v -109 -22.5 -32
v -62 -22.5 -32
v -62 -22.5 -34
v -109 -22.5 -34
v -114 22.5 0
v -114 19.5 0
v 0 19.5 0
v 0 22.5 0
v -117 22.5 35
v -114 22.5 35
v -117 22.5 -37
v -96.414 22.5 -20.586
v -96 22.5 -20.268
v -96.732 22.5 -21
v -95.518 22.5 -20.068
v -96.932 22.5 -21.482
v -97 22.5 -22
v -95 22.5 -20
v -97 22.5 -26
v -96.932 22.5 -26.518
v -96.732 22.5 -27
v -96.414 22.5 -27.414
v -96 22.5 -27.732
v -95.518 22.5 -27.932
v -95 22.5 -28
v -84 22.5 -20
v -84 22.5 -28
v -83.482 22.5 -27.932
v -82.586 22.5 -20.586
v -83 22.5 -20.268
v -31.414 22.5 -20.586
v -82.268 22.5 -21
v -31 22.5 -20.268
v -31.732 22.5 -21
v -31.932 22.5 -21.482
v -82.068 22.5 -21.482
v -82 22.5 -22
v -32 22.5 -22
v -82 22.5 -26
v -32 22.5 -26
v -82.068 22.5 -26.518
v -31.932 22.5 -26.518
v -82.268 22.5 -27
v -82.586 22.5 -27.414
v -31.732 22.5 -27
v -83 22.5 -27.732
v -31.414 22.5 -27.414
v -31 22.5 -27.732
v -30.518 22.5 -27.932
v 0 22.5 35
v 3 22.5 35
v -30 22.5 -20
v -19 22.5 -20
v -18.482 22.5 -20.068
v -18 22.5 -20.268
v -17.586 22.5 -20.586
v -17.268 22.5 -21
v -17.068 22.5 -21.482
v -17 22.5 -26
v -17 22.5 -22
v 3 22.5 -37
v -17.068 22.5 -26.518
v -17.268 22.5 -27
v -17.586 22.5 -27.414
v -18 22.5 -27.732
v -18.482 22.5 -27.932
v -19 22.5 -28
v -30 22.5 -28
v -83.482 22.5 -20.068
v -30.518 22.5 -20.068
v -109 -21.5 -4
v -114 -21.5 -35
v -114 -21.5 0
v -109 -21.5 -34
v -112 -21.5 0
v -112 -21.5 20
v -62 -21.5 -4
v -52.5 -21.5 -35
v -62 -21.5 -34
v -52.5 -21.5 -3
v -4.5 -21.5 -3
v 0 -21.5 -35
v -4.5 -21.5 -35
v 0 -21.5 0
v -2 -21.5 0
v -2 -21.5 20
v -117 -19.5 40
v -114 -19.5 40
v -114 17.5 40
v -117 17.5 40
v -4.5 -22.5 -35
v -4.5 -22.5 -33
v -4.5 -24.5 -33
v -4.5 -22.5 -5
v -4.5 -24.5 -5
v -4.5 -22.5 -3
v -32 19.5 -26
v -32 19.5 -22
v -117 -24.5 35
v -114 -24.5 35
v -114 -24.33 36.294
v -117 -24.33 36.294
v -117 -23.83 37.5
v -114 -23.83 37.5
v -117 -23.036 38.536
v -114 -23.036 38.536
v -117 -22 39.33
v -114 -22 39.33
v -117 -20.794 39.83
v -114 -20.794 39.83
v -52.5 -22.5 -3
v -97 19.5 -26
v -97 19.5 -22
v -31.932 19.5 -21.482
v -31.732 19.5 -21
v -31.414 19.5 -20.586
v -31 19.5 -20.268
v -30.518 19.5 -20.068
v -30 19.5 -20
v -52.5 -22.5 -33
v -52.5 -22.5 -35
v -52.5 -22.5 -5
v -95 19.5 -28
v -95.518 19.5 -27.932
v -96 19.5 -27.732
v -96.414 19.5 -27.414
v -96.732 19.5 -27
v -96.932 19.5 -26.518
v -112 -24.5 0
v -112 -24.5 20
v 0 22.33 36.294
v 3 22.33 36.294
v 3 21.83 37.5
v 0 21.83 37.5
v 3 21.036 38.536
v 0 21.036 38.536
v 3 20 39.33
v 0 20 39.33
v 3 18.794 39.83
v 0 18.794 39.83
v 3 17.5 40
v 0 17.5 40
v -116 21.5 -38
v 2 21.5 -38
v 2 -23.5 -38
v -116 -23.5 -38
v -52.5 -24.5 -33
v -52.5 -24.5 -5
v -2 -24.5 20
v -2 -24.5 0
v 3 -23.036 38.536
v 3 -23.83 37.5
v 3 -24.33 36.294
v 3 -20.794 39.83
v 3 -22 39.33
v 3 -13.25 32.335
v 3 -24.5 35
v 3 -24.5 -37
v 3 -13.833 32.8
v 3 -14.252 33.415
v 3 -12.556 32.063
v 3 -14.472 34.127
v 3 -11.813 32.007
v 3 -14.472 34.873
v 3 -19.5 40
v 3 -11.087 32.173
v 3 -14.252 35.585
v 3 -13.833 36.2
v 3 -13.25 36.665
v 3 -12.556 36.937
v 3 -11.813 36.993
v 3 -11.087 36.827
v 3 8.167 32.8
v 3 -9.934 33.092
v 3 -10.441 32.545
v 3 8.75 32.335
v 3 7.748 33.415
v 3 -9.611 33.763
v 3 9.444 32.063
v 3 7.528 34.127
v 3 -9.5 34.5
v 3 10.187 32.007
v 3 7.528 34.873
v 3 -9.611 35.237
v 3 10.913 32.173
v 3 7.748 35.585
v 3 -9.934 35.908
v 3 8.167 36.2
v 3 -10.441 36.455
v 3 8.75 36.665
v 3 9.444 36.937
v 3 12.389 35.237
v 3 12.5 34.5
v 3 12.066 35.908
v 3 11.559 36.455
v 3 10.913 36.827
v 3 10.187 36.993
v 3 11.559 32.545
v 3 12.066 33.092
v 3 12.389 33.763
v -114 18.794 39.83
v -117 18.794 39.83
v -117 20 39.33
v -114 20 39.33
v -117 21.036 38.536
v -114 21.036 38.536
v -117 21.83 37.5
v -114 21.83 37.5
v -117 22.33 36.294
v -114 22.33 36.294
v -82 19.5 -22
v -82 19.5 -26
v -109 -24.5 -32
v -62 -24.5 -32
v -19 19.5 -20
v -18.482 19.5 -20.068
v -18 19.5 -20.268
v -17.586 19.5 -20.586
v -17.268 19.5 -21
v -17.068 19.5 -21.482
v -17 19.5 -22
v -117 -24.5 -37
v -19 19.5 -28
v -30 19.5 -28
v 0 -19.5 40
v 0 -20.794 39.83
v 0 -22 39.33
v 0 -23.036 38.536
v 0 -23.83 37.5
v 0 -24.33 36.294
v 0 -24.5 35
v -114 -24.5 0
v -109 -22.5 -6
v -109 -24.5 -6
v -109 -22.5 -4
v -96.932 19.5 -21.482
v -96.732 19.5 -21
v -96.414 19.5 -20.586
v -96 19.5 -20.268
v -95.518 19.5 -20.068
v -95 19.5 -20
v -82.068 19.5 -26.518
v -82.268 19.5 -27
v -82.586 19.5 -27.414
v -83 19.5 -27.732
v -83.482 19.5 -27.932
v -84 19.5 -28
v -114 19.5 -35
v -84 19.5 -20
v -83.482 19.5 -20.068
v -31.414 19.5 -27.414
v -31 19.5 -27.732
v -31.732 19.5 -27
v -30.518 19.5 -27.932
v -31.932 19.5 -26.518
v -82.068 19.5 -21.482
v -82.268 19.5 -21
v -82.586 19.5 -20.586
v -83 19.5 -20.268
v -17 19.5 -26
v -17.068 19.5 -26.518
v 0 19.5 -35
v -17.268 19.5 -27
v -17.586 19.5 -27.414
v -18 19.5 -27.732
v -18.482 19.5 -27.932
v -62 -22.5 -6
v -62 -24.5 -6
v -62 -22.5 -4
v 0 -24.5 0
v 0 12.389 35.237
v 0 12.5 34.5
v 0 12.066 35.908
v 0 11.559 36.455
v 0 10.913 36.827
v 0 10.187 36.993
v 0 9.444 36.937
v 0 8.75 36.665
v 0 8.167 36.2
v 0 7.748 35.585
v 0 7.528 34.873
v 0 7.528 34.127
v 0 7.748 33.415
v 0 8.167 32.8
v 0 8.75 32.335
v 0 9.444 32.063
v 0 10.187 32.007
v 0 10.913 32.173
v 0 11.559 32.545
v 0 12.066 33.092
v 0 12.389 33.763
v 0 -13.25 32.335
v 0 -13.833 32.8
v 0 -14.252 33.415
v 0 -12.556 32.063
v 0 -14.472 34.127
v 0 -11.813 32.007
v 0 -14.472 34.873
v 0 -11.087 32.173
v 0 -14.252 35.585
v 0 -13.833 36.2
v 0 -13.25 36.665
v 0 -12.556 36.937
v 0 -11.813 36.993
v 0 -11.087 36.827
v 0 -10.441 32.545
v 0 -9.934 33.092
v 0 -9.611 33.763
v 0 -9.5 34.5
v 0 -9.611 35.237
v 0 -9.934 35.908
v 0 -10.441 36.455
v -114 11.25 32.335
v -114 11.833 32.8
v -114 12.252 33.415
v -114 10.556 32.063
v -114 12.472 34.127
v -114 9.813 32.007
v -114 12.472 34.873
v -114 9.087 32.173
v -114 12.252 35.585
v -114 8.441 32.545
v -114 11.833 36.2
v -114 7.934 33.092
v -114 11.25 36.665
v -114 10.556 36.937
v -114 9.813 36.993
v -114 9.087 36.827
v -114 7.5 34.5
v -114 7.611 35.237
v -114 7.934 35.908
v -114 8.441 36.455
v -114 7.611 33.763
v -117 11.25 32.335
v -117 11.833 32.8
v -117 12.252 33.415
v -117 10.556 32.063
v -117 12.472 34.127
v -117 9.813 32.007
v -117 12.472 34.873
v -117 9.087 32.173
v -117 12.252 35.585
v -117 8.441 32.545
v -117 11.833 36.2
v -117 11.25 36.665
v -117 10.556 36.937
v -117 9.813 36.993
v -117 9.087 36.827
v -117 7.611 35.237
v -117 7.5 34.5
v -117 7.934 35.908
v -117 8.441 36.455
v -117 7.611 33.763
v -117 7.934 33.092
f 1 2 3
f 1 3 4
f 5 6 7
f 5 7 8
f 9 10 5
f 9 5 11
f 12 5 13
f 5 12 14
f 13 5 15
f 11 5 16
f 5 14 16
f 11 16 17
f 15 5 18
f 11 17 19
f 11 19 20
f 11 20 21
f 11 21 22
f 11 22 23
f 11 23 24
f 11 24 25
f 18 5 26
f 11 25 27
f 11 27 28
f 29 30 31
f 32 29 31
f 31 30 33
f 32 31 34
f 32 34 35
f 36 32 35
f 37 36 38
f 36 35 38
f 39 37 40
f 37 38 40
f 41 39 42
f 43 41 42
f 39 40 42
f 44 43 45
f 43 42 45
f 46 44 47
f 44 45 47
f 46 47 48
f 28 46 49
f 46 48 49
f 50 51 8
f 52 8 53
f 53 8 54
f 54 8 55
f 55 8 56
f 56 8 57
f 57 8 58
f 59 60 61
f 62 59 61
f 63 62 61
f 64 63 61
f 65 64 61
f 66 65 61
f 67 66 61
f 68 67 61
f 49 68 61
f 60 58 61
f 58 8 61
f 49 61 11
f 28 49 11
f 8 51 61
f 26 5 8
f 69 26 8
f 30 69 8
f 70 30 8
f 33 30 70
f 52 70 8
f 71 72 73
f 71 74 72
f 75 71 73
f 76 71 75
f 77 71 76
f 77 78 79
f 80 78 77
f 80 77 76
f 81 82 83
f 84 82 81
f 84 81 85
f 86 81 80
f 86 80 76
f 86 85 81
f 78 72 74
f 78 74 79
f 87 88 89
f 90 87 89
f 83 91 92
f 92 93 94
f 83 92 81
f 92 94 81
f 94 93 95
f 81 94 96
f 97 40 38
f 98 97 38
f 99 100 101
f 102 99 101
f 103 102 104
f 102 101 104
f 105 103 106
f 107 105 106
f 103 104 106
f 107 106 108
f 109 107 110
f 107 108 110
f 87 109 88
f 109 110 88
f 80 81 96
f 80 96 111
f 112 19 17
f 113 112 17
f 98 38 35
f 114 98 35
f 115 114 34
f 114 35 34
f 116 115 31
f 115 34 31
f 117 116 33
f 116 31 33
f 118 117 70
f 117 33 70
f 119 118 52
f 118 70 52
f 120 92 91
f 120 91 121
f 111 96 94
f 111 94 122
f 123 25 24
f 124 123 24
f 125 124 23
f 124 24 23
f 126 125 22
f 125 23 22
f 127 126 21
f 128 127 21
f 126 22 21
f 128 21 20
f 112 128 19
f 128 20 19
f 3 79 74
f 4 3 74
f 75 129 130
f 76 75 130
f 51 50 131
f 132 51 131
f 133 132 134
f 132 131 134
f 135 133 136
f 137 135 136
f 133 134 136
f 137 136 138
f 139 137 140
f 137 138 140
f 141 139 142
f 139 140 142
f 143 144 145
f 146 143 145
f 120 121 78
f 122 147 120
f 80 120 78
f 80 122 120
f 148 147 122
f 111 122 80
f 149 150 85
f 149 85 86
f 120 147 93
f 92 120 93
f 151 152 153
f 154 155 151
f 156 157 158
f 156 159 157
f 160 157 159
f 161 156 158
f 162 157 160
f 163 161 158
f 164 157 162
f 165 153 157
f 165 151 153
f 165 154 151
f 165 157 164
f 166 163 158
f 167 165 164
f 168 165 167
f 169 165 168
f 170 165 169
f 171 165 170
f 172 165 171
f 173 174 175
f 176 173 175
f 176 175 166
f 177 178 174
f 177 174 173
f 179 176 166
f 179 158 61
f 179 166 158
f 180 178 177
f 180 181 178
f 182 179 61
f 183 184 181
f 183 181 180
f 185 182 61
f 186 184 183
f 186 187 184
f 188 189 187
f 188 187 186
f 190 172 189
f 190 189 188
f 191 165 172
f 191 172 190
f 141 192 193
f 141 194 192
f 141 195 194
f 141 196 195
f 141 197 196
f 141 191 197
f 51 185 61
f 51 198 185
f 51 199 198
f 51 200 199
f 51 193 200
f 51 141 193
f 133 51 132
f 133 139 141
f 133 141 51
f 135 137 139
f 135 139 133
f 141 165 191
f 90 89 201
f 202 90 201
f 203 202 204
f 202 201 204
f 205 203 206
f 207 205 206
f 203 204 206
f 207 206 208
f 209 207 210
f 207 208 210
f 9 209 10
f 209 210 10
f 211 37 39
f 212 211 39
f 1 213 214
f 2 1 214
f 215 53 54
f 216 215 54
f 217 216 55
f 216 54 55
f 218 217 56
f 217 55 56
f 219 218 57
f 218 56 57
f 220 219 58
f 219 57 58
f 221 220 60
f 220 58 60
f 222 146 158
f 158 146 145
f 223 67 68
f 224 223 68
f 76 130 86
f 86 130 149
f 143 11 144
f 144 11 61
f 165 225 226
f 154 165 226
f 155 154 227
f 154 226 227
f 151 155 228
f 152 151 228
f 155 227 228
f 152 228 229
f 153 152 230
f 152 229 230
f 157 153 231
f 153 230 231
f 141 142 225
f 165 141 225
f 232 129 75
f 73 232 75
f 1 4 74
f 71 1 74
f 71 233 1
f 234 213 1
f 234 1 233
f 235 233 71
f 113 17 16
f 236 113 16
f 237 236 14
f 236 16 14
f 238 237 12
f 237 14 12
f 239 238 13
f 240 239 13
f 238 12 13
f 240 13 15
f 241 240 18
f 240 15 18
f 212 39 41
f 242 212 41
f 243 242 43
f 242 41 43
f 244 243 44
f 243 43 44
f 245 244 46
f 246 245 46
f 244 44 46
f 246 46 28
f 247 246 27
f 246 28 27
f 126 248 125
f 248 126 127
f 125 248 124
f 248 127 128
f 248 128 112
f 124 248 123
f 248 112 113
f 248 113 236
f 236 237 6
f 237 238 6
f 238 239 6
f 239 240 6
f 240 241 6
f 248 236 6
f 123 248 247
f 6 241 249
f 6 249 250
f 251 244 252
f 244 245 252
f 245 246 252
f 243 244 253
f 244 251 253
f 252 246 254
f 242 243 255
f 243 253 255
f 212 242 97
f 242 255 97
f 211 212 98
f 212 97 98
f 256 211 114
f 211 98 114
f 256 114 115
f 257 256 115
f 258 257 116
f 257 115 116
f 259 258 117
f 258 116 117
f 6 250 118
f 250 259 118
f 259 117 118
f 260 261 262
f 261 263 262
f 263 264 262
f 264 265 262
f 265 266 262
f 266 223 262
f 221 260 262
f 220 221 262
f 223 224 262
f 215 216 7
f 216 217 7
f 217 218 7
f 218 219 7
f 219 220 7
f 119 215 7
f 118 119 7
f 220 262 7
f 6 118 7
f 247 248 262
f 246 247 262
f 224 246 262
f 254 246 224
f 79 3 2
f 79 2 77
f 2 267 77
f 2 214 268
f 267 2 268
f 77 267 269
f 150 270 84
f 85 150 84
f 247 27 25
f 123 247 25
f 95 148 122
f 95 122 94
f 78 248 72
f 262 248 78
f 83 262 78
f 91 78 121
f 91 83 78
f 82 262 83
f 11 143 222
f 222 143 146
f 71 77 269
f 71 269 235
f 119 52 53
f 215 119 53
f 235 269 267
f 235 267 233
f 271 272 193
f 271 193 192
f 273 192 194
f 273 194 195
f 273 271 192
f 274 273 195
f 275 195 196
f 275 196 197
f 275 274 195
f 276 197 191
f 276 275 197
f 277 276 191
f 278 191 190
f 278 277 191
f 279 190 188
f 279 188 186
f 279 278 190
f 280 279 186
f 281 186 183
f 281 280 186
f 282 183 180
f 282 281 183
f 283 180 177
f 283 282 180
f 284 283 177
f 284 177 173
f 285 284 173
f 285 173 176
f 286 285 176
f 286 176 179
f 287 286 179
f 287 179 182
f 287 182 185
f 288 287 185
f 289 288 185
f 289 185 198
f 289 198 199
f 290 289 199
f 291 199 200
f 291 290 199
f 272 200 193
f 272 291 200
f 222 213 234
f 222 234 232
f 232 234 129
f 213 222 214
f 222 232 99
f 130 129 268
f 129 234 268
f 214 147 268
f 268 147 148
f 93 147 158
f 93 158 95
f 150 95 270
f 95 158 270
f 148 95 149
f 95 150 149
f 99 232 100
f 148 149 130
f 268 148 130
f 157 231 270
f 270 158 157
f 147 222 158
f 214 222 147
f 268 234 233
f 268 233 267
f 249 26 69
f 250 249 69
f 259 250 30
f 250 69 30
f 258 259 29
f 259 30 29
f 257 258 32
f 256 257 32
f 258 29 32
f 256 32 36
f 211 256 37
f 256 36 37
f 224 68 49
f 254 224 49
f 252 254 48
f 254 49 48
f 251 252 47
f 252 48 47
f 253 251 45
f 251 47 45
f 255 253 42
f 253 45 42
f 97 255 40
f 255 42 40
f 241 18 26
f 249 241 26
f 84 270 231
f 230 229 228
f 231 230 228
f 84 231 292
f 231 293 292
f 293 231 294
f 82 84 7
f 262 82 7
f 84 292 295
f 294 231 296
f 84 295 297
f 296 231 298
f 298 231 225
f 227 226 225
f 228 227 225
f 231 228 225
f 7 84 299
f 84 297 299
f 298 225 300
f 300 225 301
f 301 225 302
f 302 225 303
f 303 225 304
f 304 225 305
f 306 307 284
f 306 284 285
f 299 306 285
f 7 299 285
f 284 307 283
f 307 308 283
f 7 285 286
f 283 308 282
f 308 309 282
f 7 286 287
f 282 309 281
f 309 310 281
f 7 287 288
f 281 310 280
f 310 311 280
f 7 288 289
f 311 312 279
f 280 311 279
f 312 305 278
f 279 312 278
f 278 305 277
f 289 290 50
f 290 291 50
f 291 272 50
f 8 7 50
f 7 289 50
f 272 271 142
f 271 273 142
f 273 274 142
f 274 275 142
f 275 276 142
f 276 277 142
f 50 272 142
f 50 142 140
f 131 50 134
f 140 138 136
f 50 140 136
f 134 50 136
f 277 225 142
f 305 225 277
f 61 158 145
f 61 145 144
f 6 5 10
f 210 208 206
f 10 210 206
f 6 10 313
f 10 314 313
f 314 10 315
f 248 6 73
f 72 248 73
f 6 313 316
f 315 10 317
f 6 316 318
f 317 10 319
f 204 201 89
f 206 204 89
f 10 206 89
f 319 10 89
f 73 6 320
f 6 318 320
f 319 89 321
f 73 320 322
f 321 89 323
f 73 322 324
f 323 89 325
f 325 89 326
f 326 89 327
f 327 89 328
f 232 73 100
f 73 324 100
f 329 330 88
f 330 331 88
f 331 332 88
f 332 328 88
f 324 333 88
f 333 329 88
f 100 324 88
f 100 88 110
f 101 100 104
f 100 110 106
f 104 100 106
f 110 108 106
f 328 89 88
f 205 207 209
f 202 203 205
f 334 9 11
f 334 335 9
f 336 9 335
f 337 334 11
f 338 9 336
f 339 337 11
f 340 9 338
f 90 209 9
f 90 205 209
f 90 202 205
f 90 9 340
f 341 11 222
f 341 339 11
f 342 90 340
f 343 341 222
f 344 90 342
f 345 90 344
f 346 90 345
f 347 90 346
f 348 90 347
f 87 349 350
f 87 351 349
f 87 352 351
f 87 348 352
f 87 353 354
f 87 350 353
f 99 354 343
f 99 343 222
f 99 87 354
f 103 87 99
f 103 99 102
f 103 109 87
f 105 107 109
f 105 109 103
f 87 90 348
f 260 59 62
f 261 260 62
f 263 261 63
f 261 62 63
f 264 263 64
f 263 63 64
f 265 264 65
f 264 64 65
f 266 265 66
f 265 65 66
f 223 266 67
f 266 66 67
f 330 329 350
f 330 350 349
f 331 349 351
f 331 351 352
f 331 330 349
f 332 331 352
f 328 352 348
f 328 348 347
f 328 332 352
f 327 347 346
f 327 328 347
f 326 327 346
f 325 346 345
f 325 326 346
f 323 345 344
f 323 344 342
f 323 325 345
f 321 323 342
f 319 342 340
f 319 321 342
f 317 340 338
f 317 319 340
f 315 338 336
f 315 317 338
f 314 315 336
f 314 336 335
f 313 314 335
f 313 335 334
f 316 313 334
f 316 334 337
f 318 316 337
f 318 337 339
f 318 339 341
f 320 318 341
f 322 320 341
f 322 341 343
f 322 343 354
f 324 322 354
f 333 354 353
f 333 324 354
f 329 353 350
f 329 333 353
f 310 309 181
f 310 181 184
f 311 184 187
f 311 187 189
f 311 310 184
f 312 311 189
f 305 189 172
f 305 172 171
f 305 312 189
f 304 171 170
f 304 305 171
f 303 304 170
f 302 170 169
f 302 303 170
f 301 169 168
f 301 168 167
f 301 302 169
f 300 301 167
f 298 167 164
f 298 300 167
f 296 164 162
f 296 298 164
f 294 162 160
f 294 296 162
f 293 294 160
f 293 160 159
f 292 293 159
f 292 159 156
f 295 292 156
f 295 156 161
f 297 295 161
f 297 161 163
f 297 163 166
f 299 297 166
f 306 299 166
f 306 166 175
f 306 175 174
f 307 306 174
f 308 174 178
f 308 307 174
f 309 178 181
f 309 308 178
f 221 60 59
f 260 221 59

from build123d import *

# Parameters (mm, degrees)
F2_R      = 2.5
F3_DEPTH  = 3
F4_W      = 3
F4_H      = 3
F4_W_2    = 41
F4_H_2    = 35
F5_DEPTH  = 114
F6_R      = 2.5
F7_DEPTH  = 3
F8_W      = 110
F8_H      = 20
F9_DEPTH  = 3
F10_W     = 47
F10_H     = 26
F10_W_2   = 48
F10_H_2   = 28
F11_DEPTH = 3
F13_DEPTH = 3
F14_SIZE  = 1
F16_W     = 48
F16_H     = 2
F16_W_2   = 47
F17_DEPTH = 1


with BuildPart() as f3:
    # F2 (on Right) → F3 (new body)
    with BuildSketch(Plane.YZ):
        with BuildLine():
            ThreePointArc((22.5, 35), (21.0355339059, 38.5355339059), (17.5, 40))
            Line((17.5, 40), (-19.5, 40))
            ThreePointArc((-19.5, 40), (-23.0355339059, 38.5355339059), (-24.5, 35))
            Line((-24.5, 35), (-24.5, -38))
            Line((-24.5, -38), (22.5, -38))
            Line((22.5, -38), (22.5, 35))
        make_face()
        with Locations((-12, 34.5)):
            Circle(F2_R, mode=Mode.SUBTRACT)
        with Locations((10, 34.5)):
            Circle(F2_R, mode=Mode.SUBTRACT)
    extrude(amount=F3_DEPTH)

    # F4 (on Right) → F5 (join)
    with BuildSketch(Plane.YZ):
        with Locations((21, -36.5)):
            Rectangle(F4_W, F4_H)
        with Locations((-1, -36.5)):
            Rectangle(F4_W_2, F4_H)
        with Locations((21, -17.5)):
            Rectangle(F4_W, F4_H_2)
        with Locations((-23, -36.5)):
            Rectangle(F4_W, F4_H)
        with Locations((-23, -17.5)):
            Rectangle(F4_W, F4_H_2)
    extrude(amount=-F5_DEPTH)

    # F6 (on face) → F7 (join)
    with BuildSketch(Plane(origin=(-114, 0, 0), x_dir=(0, -1, 0), z_dir=(-1, 0, 0))):
        with BuildLine():
            ThreePointArc((24.5, 35), (23.0355339059, 38.5355339059), (19.5, 40))
            Line((19.5, 40), (-17.5, 40))
            ThreePointArc((-17.5, 40), (-21.0355339059, 38.5355339059), (-22.5, 35))
            Line((-22.5, 35), (-22.5, -38))
            Line((-22.5, -38), (24.5, -38))
            Line((24.5, -38), (24.5, 35))
        make_face()
        with Locations((-10, 34.5)):
            Circle(F6_R, mode=Mode.SUBTRACT)
    extrude(amount=F7_DEPTH)

    # F8 (on face) → F9 (join)
    with BuildSketch(Plane.XZ.offset(24.5)):
        with Locations((-57, 10)):
            Rectangle(F8_W, F8_H)
    extrude(amount=-F9_DEPTH)

    # F10 (on face) → F11 (cut, through all)
    with BuildSketch(Plane.XZ.offset(24.5)):
        with Locations((-85.5, -19)):
            Rectangle(F10_W, F10_H)
        with Locations((-28.5, -19)):
            Rectangle(F10_W_2, F10_H_2)
    extrude(amount=-F11_DEPTH, mode=Mode.SUBTRACT)

    # F12 (on face) → F13 (cut, through all)
    with BuildSketch(Plane(origin=(0, 22.5, 0), x_dir=(-1, 0, 0), z_dir=(0, 1, 0))):
        with BuildLine():
            ThreePointArc((82, -26), (82.5857864376, -27.4142135624), (84, -28))
            Line((84, -28), (95, -28))
            ThreePointArc((95, -28), (96.4142135624, -27.4142135624), (97, -26))
            Line((97, -26), (97, -22))
            ThreePointArc((97, -22), (96.4142135624, -20.5857864376), (95, -20))
            Line((95, -20), (84, -20))
            ThreePointArc((84, -20), (82.5857864376, -20.5857864376), (82, -22))
            Line((82, -22), (82, -26))
        make_face()
        with BuildLine():
            ThreePointArc((17, -26), (17.5857864376, -27.4142135624), (19, -28))
            Line((19, -28), (30, -28))
            ThreePointArc((30, -28), (31.4142135624, -27.4142135624), (32, -26))
            Line((32, -26), (32, -22))
            ThreePointArc((32, -22), (31.4142135624, -20.5857864376), (30, -20))
            Line((30, -20), (19, -20))
            ThreePointArc((19, -20), (17.5857864376, -20.5857864376), (17, -22))
            Line((17, -22), (17, -26))
        make_face()
    extrude(amount=-F13_DEPTH, mode=Mode.SUBTRACT)

    # F14
    f14_edges = [f3.edges().sort_by_distance(p)[0] for p in [
        (-57, -24.5, -38),
        (3, -1, -38),
        (-57, 22.5, -38),
        (-117, -1, -38),
    ]]
    chamfer(f14_edges, length=F14_SIZE)

    # F16 (on face) → F17 (cut)
    with BuildSketch(Plane(origin=(0, -21.5, 0), x_dir=(-1, 0, 0), z_dir=(0, 1, 0))):
        with Locations((28.5, -34)):
            Rectangle(F16_W, F16_H)
        with Locations((85.5, -33)):
            Rectangle(F16_W_2, F16_H)
        with Locations((85.5, -5)):
            Rectangle(F16_W_2, F16_H)
        with Locations((28.5, -4)):
            Rectangle(F16_W, F16_H)
    extrude(amount=-F17_DEPTH, mode=Mode.SUBTRACT)


solid = f3.part
